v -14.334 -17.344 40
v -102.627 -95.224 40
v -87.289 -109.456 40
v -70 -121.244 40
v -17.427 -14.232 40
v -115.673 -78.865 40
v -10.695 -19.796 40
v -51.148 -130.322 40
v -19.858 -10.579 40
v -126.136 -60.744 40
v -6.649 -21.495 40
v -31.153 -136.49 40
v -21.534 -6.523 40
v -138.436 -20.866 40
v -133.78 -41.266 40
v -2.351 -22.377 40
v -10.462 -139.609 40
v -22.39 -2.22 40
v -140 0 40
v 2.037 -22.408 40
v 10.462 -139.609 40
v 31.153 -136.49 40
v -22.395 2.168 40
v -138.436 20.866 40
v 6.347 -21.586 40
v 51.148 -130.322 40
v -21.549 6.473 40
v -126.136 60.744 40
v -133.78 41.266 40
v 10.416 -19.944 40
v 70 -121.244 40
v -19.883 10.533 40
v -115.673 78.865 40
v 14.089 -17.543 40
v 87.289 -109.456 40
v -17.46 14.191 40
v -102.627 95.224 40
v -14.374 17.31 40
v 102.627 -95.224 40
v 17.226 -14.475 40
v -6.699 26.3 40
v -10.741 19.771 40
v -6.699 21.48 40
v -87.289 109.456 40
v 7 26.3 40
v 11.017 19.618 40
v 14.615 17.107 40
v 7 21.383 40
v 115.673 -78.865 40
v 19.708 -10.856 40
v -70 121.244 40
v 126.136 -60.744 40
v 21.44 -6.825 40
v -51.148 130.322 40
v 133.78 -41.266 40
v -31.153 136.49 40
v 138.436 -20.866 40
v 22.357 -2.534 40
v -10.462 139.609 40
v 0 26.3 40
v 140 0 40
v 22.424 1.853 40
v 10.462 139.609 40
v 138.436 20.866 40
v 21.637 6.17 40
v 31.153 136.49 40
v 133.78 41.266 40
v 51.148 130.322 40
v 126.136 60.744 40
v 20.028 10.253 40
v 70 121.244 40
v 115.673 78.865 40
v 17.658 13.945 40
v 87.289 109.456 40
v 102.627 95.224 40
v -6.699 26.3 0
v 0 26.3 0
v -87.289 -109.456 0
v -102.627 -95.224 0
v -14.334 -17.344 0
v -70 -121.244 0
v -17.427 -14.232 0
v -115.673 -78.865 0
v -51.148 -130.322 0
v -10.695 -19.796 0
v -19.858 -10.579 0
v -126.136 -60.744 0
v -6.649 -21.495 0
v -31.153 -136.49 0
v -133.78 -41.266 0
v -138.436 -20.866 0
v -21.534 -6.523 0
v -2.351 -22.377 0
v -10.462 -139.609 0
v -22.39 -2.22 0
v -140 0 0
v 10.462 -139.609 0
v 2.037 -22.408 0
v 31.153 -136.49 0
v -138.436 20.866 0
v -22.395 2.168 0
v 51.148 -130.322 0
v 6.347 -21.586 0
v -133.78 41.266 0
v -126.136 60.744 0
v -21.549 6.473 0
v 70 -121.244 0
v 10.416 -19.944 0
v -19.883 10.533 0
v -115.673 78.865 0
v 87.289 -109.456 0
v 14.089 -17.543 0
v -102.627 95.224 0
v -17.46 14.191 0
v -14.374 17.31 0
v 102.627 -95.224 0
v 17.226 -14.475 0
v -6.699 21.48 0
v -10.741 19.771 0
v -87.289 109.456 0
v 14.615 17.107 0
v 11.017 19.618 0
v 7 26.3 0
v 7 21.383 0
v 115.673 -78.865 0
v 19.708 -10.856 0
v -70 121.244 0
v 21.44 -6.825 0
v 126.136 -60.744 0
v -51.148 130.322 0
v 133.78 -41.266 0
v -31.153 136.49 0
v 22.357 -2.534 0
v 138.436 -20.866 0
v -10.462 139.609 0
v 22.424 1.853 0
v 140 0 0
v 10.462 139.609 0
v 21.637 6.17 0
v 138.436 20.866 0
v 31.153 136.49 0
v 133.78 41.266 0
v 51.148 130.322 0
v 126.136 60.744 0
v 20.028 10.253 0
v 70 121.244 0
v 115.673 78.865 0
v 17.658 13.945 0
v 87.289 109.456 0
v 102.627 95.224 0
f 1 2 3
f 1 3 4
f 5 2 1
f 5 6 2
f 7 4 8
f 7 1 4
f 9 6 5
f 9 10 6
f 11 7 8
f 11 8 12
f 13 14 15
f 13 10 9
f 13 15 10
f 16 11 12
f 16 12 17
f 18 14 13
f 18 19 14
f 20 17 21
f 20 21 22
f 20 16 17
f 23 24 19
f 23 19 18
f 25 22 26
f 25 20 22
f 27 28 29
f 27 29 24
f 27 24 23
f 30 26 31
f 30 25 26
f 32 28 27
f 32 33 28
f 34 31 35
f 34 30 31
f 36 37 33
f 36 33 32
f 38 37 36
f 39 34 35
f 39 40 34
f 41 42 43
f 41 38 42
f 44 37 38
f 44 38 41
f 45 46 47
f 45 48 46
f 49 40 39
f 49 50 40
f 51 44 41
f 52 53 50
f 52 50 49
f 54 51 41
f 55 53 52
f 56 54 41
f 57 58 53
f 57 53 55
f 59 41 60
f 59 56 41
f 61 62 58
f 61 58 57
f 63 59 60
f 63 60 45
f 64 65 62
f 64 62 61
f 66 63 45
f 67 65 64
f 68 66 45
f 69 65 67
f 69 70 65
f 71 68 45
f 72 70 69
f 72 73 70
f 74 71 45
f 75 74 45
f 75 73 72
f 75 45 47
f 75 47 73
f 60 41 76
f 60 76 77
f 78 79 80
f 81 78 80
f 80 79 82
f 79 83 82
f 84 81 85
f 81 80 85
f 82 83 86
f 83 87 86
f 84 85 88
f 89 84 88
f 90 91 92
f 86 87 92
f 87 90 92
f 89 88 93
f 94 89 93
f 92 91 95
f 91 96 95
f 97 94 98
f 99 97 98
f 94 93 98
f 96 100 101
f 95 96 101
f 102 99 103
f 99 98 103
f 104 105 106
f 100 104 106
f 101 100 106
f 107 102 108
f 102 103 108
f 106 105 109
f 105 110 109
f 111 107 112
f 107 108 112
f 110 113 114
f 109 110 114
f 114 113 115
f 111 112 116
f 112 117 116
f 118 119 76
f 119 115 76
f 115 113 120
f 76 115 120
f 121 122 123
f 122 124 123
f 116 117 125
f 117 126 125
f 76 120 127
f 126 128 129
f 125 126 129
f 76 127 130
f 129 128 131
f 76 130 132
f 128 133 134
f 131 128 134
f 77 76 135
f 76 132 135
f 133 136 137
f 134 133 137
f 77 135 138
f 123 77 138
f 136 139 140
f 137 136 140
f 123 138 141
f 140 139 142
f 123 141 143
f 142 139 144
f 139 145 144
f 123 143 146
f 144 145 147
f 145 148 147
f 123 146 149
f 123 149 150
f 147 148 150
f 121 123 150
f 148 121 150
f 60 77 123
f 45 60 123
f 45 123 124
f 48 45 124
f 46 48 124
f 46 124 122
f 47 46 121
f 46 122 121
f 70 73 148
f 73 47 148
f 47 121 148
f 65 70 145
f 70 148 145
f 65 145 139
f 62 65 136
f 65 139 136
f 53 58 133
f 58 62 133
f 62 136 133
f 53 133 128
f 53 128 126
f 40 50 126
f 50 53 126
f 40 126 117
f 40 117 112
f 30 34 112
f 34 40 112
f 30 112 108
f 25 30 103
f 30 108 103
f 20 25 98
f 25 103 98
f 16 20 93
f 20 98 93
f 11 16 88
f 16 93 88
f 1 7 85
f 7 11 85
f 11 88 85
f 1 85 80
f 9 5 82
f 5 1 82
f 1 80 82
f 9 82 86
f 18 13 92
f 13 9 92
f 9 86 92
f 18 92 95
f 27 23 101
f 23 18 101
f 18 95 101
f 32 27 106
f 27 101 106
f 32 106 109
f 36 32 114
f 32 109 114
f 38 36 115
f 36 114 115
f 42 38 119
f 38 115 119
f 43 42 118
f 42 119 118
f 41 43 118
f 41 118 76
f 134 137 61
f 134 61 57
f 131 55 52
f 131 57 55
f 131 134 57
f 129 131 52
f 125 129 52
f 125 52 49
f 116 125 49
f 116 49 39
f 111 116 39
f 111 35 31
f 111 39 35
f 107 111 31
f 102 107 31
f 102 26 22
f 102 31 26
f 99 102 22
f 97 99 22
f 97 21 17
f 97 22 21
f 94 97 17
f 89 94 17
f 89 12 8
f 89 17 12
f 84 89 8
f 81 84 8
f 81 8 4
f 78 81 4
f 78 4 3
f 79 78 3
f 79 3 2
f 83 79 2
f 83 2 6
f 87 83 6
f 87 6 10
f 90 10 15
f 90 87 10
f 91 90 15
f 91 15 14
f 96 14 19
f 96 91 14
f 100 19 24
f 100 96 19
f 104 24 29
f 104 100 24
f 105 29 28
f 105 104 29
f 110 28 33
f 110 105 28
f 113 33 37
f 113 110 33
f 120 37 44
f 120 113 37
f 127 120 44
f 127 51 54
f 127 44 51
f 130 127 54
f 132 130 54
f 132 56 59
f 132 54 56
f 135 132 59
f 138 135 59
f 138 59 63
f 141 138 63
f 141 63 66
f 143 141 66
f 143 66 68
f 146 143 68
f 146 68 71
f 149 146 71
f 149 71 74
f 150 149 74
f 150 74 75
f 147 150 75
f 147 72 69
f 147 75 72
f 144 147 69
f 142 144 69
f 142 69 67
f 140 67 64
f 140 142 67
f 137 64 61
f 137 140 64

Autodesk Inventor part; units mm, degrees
sketch "スケッチ1" plane through (0, 0, 0) normal (0, 0, 1) x (1, 0, 0)
  circle A0 centre (0, 0) radius 140
  arc A1 (-6.6994, 21.4795) -> (7, 21.3834) centre (0, 0) ccw
  line L0 (0, 22.5) -> (0, 17)
  line L1 (0, 22.5) -> (0, 26.3)
  line L2 (0, 26.3) -> (7, 26.3)
  line L3 (7, 26.3) -> (7, 21.3834)
  line L4 (7, 17) -> (0, 17)
  line L5 (-6.6994, 21.4795) -> (-6.6994, 26.3)
  line L6 (-6.6994, 26.3) -> (0, 26.3)
  dimension "d0" = 280
  dimension "d1" = 45
  dimension "d2" = 5.5
  dimension "d3" = 3.8
  dimension "d4" = 7
extrude "押し出し1" add sketch "スケッチ1" along normal blind 40
properties part number "gear2"
